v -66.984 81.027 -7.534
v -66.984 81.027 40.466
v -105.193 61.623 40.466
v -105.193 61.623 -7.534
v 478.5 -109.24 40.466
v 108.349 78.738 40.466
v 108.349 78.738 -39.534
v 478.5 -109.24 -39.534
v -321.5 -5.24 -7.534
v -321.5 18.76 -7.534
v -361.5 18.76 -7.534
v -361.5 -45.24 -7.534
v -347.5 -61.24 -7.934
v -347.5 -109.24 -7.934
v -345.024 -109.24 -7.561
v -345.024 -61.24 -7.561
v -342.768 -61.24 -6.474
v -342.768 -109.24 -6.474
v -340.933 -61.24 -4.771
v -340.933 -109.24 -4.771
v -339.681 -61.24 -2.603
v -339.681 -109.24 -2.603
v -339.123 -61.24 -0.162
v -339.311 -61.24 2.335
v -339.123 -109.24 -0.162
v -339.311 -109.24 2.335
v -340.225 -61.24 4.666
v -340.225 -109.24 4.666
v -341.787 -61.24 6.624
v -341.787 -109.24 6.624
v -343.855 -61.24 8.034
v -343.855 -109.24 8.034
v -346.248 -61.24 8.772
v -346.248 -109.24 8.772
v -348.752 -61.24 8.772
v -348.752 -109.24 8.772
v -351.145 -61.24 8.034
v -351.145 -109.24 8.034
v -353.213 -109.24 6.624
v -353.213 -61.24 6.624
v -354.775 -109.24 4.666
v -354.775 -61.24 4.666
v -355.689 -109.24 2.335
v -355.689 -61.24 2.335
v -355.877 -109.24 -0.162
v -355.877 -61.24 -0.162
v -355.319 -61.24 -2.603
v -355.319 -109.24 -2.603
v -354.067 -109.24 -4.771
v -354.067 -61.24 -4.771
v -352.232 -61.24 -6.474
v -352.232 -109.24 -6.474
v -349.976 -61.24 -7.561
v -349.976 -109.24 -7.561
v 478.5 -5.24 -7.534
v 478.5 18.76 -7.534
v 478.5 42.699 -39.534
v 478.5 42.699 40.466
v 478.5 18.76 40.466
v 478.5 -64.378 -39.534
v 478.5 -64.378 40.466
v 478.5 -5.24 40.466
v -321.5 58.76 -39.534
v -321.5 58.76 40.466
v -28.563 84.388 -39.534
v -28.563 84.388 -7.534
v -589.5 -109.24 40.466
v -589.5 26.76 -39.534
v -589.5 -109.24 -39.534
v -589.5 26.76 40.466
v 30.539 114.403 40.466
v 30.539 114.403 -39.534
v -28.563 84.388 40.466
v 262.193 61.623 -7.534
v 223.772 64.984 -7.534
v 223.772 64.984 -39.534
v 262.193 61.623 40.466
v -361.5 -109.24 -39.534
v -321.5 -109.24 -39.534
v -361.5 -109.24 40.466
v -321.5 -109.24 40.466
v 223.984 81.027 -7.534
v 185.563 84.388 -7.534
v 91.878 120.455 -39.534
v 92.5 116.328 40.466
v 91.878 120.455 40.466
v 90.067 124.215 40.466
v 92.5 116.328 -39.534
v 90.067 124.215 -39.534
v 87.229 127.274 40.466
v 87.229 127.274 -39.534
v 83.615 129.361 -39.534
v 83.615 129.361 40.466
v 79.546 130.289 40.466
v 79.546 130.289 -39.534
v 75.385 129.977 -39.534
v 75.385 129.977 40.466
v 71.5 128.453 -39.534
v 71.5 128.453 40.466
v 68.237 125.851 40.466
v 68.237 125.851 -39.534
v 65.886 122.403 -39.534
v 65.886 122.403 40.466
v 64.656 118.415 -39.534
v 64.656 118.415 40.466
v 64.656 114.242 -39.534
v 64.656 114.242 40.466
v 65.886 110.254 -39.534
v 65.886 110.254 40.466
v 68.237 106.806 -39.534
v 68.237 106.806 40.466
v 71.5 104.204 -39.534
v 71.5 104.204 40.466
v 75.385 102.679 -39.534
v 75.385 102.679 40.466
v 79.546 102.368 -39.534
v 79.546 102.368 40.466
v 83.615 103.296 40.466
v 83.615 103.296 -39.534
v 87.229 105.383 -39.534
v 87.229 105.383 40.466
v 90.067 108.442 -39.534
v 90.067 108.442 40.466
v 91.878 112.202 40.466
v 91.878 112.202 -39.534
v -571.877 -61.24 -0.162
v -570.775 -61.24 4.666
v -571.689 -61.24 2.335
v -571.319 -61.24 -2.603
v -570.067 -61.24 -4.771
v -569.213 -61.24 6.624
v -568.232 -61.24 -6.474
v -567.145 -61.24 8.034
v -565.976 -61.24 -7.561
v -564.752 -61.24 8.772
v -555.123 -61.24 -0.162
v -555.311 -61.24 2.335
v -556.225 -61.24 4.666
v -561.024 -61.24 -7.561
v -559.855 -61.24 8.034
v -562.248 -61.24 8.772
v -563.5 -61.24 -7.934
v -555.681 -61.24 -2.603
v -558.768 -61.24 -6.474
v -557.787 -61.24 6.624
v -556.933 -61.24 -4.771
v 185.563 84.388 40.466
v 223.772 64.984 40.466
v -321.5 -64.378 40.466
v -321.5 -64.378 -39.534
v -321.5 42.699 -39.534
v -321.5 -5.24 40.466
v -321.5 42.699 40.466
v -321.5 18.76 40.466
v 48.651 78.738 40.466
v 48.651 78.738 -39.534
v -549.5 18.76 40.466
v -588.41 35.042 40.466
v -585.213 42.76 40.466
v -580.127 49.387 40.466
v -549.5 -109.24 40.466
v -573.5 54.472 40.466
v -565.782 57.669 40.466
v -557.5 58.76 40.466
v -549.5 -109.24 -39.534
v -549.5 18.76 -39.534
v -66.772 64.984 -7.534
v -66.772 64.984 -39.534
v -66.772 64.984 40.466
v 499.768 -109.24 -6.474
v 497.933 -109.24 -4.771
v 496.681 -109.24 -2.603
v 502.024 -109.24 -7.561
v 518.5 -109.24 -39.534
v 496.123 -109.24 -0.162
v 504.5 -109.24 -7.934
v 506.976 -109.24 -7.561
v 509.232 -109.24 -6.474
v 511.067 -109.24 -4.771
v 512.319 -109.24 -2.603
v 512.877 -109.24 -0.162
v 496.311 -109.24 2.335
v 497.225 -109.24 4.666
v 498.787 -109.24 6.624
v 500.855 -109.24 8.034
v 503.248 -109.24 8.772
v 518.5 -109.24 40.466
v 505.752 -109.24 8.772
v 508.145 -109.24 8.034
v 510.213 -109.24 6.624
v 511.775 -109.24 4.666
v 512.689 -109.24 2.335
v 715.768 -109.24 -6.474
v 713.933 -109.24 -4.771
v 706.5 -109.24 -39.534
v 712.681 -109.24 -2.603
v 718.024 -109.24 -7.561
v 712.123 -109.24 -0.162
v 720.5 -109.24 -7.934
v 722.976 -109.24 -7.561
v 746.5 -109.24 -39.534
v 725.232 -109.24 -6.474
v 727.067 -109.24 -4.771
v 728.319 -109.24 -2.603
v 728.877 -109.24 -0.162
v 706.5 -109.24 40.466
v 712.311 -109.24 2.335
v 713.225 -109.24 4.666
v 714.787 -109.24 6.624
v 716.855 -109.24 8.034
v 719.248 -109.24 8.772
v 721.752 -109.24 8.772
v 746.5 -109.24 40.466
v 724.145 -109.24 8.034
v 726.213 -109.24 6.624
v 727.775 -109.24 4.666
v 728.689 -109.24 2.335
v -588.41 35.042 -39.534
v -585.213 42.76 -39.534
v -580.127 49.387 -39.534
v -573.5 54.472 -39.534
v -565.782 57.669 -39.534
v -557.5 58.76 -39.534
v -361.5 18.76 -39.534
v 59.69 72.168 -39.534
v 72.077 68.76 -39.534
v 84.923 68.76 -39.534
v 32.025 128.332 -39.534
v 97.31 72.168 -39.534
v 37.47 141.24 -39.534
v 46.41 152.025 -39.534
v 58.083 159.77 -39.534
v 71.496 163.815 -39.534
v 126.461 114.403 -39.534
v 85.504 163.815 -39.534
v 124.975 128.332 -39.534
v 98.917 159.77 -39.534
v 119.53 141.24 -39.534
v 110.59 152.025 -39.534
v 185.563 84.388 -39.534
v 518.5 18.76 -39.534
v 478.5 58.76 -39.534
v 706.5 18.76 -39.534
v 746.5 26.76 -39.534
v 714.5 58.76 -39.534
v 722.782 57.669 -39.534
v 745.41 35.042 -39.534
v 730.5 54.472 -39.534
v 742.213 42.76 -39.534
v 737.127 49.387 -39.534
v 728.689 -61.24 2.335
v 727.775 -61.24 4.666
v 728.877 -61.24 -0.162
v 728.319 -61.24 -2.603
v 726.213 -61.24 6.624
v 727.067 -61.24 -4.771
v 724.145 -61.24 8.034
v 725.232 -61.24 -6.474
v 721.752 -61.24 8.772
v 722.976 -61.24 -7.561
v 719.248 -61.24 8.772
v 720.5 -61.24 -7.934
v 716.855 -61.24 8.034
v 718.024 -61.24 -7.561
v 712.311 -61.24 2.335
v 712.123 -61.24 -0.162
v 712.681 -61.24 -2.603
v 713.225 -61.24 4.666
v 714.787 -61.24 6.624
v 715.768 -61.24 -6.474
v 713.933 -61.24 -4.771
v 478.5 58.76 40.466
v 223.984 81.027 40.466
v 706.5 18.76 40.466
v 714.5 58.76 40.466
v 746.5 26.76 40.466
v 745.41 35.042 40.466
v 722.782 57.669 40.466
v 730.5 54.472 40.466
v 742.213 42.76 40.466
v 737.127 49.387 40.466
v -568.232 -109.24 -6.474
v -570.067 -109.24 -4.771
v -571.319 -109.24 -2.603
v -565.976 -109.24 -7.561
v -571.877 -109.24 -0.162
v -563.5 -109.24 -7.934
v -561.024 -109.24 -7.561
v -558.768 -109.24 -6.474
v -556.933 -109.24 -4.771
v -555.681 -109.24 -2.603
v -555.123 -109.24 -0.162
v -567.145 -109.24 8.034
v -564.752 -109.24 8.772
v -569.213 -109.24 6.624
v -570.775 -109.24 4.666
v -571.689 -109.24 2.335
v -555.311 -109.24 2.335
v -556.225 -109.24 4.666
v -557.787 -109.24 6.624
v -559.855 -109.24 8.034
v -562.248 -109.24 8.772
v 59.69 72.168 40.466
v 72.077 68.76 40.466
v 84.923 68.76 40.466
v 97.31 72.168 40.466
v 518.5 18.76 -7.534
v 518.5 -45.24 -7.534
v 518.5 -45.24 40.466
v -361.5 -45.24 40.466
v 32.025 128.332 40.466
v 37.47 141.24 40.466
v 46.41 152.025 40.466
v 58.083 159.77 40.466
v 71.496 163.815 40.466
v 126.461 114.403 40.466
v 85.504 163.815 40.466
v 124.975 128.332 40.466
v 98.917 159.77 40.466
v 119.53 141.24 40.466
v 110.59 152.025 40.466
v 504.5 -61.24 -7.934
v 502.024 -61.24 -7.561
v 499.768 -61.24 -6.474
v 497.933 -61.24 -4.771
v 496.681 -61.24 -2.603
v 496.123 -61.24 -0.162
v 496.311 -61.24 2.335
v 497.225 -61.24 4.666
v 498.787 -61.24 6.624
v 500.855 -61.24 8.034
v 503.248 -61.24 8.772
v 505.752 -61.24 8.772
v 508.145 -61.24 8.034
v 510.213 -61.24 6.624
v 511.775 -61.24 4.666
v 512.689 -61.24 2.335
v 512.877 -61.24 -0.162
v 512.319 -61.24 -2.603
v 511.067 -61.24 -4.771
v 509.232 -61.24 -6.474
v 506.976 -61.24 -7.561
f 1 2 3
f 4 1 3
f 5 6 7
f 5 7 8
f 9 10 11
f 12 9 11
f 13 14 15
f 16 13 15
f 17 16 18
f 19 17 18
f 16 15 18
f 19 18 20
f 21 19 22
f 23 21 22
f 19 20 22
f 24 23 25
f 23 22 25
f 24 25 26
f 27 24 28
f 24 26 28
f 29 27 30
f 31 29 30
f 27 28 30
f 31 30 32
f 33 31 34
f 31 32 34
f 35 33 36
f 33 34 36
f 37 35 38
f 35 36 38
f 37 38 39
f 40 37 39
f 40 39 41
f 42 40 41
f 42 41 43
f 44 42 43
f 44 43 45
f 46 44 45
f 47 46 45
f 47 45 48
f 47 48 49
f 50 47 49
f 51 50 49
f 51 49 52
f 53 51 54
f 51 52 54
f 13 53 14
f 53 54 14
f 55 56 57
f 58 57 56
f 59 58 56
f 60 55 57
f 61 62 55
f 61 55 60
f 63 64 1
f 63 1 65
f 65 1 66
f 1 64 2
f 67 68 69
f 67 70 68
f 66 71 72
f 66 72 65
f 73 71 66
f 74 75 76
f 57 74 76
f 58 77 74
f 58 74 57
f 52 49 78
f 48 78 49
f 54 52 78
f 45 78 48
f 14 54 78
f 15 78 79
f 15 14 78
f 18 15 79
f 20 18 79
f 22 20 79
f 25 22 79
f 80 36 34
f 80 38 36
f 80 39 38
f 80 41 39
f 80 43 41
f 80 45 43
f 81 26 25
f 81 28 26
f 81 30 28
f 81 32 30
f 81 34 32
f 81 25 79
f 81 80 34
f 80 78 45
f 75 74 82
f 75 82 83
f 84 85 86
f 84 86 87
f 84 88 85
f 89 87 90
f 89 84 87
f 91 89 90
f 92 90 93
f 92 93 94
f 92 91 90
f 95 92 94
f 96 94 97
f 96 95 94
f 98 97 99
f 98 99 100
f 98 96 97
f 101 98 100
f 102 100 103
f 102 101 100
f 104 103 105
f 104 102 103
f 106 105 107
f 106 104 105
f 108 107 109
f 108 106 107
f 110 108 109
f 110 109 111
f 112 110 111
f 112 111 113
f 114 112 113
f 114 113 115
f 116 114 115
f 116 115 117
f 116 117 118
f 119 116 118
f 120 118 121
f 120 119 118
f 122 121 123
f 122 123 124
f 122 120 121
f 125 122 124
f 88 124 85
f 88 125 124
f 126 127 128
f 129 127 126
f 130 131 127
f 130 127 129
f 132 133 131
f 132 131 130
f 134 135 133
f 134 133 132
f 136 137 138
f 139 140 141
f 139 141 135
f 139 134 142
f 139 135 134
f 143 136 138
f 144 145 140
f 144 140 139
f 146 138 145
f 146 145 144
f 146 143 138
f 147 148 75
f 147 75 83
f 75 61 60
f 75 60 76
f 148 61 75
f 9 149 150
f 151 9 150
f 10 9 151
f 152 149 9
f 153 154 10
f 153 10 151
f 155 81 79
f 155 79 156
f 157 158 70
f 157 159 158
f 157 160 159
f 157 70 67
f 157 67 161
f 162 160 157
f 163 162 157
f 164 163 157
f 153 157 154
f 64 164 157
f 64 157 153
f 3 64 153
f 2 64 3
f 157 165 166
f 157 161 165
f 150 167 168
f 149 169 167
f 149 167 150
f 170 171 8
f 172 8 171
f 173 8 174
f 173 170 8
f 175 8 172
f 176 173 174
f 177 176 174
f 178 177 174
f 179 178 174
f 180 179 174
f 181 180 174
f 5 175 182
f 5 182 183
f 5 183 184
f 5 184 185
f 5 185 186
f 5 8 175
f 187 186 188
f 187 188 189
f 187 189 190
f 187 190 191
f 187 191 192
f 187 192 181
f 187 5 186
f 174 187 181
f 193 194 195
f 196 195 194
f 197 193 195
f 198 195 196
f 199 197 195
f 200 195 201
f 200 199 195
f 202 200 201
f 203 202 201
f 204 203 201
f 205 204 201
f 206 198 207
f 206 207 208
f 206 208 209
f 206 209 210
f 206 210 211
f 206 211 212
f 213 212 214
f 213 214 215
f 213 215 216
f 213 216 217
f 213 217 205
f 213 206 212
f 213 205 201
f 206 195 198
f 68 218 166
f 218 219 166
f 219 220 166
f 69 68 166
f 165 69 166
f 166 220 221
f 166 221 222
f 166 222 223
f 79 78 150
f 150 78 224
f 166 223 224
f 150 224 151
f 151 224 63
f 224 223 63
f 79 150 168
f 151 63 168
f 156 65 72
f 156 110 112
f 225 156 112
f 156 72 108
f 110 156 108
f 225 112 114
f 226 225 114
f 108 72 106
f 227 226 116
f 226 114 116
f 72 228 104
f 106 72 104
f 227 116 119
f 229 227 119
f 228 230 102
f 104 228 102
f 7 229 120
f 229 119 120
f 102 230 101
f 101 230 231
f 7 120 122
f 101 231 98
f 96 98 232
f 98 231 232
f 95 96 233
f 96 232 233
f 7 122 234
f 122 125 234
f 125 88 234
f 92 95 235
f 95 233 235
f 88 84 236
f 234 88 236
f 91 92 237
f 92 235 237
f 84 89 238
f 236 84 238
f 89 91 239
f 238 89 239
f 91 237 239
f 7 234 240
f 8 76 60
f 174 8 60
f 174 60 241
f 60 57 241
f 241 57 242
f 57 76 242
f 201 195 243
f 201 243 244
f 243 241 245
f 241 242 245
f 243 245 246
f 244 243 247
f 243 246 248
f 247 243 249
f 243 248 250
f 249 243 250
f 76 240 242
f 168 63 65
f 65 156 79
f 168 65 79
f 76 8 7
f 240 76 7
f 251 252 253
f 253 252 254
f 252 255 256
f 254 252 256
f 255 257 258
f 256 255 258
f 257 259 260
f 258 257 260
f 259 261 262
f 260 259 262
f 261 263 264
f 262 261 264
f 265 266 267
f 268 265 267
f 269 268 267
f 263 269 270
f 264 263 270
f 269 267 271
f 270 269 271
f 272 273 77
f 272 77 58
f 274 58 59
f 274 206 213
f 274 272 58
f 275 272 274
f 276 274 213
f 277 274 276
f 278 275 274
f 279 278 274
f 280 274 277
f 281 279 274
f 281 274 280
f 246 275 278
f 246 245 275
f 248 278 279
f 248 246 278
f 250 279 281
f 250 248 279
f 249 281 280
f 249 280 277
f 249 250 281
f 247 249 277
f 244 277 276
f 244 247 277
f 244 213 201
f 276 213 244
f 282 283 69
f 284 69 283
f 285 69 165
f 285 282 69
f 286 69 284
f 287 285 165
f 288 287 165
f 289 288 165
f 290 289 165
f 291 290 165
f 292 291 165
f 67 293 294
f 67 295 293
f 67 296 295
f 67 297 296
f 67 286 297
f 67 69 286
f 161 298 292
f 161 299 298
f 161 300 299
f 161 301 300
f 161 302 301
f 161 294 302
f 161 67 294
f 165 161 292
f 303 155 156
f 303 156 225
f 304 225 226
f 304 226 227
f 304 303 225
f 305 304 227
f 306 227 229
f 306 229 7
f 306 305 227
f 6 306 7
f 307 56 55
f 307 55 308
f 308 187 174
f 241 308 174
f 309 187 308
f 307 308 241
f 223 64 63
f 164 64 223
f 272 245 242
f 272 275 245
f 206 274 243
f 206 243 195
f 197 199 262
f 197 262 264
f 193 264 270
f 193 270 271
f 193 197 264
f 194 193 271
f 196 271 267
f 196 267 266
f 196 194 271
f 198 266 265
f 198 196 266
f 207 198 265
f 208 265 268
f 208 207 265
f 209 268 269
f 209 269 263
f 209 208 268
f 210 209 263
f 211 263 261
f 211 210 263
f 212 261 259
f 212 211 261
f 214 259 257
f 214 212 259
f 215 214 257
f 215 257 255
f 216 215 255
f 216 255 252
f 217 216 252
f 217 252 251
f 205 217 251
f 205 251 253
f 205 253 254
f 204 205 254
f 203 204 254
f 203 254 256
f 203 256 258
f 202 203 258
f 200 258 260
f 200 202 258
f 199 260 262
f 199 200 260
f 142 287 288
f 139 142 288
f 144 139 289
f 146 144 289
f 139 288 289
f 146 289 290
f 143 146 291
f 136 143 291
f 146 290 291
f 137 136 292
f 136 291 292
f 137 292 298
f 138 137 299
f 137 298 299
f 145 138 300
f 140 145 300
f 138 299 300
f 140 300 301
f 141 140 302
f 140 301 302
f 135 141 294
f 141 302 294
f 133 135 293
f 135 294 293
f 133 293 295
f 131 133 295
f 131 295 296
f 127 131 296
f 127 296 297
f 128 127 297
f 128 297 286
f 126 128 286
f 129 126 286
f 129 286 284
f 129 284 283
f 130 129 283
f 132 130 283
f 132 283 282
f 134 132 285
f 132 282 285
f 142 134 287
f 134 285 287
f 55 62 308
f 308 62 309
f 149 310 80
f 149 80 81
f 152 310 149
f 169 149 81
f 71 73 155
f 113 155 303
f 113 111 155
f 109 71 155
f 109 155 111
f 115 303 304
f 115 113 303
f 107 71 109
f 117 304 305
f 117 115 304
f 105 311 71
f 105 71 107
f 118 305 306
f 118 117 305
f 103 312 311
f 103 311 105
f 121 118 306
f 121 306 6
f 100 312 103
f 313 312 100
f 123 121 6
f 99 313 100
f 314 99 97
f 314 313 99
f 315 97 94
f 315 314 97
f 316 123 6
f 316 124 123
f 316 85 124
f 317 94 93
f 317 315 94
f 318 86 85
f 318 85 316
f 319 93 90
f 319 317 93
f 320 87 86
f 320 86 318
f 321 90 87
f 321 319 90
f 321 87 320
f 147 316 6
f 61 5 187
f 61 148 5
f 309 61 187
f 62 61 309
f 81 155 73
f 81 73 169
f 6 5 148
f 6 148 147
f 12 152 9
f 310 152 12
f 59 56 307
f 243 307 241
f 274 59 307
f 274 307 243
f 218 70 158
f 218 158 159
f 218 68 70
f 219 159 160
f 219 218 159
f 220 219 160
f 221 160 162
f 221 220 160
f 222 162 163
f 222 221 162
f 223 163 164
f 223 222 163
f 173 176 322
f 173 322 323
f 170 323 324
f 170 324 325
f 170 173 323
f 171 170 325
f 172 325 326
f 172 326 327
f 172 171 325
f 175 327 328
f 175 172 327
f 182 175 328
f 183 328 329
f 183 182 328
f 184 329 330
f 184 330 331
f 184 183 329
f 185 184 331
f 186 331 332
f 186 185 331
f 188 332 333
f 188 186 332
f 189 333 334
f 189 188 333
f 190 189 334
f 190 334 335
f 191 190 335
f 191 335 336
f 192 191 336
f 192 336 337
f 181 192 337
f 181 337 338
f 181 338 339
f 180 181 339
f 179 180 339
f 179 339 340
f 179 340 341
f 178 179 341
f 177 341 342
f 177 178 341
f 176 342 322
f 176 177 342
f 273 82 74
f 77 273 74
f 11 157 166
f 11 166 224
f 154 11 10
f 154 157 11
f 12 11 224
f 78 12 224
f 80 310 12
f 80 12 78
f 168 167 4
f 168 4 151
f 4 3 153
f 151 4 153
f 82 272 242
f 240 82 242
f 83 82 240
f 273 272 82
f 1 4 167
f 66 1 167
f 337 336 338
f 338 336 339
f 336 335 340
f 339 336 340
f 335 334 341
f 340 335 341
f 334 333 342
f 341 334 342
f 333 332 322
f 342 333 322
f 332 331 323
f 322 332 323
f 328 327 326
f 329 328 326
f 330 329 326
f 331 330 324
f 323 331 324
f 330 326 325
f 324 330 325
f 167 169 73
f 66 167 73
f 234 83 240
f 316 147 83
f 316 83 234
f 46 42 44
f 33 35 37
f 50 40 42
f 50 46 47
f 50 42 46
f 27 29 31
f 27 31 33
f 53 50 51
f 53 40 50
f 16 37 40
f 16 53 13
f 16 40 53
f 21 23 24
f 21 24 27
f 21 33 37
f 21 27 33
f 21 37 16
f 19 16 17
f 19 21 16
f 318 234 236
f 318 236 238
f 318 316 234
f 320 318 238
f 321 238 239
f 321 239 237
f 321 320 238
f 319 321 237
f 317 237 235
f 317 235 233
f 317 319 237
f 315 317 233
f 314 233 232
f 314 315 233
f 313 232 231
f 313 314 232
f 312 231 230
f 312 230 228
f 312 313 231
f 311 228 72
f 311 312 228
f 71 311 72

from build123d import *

# Parameters (mm, degrees)
SKICA1_R                 = 1.75
P_IDAT_VYSUNUT_M1_DEPTH  = 5
ZAOBLIT1_R               = 4
P_IDAT_VYSUNUT_M2_DEPTH  = 5
SKICA3_R                 = 1.05
ODEBRAT_VYSUNUT_M1_DEPTH = 6
ODEBRAT_VYSUNUT_M2_DEPTH = 6
ODEBRAT_VYSUNUT_M3_DEPTH = 6
SCALE1_SCALE             = 8


with BuildPart() as part:
    # Skica1 → Přidat vysunutím1 (new, symmetric)
    with BuildSketch(Plane.XY):
        with BuildLine():
            Line((0, 0), (0, 16))
            Line((0, 16), (23.5, 16))
            Line((23.5, 16), (23.5, 0))
            Line((23.5, 0), (28.5, 0))
            Line((28.5, 0), (74.768828107, 23.497329584))
            ThreePointArc((74.768828107, 23.497329584), (78.5, 22.196090729), (82.231171893, 23.497329584))
            Line((82.231171893, 23.497329584), (128.5, 0))
            Line((128.5, 0), (133.5, 0))
            Line((133.5, 0), (133.5, 16))
            Line((133.5, 16), (157, 16))
            Line((157, 16), (157, 0))
            Line((157, 0), (162, 0))
            Line((162, 0), (162, 21))
            Line((162, 21), (128.5, 21))
            Line((128.5, 21), (128.5, 5.607818541))
            Line((128.5, 5.607818541), (84.49517003, 27.955391095))
            ThreePointArc((84.49517003, 27.955391095), (78.5, 34.196090729), (72.50482997, 27.955391095))
            Line((72.50482997, 27.955391095), (28.5, 5.607818541))
            Line((28.5, 5.607818541), (28.5, 21))
            Line((28.5, 21), (-5, 21))
            Line((-5, 21), (-5, 0))
            Line((-5, 0), (0, 0))
        make_face()
        with Locations((78.5, 28.196090729)):
            Circle(SKICA1_R, mode=Mode.SUBTRACT)
    extrude(amount=P_IDAT_VYSUNUT_M1_DEPTH, both=True)

    # Zaoblit1
    zaoblit1_edges = [part.edges().sort_by_distance(p)[0] for p in [
        (-5, 21, 0),
        (162, 21, 0),
    ]]
    fillet(zaoblit1_edges, radius=ZAOBLIT1_R)

    # Skica2 → Přidat vysunutím2 (add, symmetric)
    with BuildSketch(Plane.XY):
        Polygon((28.5, 21), (65.117103916, 24.203581484), (60.341045967, 21.778090882), (28.5, 18.992360325), align=None)
    p_idat_vysunut_m2 = extrude(amount=P_IDAT_VYSUNUT_M2_DEPTH, both=True)

    # Zrcadlit1: Přidat vysunutím2 across plane
    add(p_idat_vysunut_m2.mirror(Plane.ZY.offset(-78.5)))

    # Skica3 → Odebrat vysunutím1 (cut)
    with BuildSketch(Plane.XZ):
        with Locations(Location((-1.75, 0, 0), (0, 0, 270))):
            Circle(SKICA3_R)
        with Locations(Location((25.25, 0, 0), (0, 0, 270))):
            Circle(SKICA3_R)
    odebrat_vysunut_m1 = extrude(amount=-ODEBRAT_VYSUNUT_M1_DEPTH, mode=Mode.SUBTRACT)

    # Zrcadlit2: Odebrat vysunutím1 across plane
    add(odebrat_vysunut_m1.mirror(Plane.ZY.offset(-78.5)), mode=Mode.SUBTRACT)

    # Skica4 → Odebrat vysunutím2 (cut)
    with BuildSketch(Plane.XY.offset(5)):
        Polygon((23.5, 16), (28.5, 16), (28.5, 13), (23.5, 8), align=None)
    odebrat_vysunut_m2 = extrude(amount=-ODEBRAT_VYSUNUT_M2_DEPTH, mode=Mode.SUBTRACT)

    # Zrcadlit3: Odebrat vysunutím2 across plane
    add(odebrat_vysunut_m2.mirror(Plane.ZY.offset(-78.5)), mode=Mode.SUBTRACT)

    # Skica5 → Odebrat vysunutím3 (cut)
    with BuildSketch(Plane.XY.offset(5)):
        Polygon((60.341045967, 21.778090882), (65.117103916, 24.203581484), (60.314461293, 23.783404699), (55.538403344, 21.357914097), align=None)
        Polygon((91.882896084, 24.203581484), (96.685538707, 23.783404699), (101.461596656, 21.357914097), (96.658954033, 21.778090882), align=None)
    extrude(amount=-ODEBRAT_VYSUNUT_M3_DEPTH, mode=Mode.SUBTRACT)


with BuildPart() as part_1:
    # Scale1: scaled about (78.5, 15.605763545, -0.066585977)
    add(part.part.scale(SCALE1_SCALE).moved(Location((-549.5, -109.240344815, 0.466101839))))


solid = part_1.part
